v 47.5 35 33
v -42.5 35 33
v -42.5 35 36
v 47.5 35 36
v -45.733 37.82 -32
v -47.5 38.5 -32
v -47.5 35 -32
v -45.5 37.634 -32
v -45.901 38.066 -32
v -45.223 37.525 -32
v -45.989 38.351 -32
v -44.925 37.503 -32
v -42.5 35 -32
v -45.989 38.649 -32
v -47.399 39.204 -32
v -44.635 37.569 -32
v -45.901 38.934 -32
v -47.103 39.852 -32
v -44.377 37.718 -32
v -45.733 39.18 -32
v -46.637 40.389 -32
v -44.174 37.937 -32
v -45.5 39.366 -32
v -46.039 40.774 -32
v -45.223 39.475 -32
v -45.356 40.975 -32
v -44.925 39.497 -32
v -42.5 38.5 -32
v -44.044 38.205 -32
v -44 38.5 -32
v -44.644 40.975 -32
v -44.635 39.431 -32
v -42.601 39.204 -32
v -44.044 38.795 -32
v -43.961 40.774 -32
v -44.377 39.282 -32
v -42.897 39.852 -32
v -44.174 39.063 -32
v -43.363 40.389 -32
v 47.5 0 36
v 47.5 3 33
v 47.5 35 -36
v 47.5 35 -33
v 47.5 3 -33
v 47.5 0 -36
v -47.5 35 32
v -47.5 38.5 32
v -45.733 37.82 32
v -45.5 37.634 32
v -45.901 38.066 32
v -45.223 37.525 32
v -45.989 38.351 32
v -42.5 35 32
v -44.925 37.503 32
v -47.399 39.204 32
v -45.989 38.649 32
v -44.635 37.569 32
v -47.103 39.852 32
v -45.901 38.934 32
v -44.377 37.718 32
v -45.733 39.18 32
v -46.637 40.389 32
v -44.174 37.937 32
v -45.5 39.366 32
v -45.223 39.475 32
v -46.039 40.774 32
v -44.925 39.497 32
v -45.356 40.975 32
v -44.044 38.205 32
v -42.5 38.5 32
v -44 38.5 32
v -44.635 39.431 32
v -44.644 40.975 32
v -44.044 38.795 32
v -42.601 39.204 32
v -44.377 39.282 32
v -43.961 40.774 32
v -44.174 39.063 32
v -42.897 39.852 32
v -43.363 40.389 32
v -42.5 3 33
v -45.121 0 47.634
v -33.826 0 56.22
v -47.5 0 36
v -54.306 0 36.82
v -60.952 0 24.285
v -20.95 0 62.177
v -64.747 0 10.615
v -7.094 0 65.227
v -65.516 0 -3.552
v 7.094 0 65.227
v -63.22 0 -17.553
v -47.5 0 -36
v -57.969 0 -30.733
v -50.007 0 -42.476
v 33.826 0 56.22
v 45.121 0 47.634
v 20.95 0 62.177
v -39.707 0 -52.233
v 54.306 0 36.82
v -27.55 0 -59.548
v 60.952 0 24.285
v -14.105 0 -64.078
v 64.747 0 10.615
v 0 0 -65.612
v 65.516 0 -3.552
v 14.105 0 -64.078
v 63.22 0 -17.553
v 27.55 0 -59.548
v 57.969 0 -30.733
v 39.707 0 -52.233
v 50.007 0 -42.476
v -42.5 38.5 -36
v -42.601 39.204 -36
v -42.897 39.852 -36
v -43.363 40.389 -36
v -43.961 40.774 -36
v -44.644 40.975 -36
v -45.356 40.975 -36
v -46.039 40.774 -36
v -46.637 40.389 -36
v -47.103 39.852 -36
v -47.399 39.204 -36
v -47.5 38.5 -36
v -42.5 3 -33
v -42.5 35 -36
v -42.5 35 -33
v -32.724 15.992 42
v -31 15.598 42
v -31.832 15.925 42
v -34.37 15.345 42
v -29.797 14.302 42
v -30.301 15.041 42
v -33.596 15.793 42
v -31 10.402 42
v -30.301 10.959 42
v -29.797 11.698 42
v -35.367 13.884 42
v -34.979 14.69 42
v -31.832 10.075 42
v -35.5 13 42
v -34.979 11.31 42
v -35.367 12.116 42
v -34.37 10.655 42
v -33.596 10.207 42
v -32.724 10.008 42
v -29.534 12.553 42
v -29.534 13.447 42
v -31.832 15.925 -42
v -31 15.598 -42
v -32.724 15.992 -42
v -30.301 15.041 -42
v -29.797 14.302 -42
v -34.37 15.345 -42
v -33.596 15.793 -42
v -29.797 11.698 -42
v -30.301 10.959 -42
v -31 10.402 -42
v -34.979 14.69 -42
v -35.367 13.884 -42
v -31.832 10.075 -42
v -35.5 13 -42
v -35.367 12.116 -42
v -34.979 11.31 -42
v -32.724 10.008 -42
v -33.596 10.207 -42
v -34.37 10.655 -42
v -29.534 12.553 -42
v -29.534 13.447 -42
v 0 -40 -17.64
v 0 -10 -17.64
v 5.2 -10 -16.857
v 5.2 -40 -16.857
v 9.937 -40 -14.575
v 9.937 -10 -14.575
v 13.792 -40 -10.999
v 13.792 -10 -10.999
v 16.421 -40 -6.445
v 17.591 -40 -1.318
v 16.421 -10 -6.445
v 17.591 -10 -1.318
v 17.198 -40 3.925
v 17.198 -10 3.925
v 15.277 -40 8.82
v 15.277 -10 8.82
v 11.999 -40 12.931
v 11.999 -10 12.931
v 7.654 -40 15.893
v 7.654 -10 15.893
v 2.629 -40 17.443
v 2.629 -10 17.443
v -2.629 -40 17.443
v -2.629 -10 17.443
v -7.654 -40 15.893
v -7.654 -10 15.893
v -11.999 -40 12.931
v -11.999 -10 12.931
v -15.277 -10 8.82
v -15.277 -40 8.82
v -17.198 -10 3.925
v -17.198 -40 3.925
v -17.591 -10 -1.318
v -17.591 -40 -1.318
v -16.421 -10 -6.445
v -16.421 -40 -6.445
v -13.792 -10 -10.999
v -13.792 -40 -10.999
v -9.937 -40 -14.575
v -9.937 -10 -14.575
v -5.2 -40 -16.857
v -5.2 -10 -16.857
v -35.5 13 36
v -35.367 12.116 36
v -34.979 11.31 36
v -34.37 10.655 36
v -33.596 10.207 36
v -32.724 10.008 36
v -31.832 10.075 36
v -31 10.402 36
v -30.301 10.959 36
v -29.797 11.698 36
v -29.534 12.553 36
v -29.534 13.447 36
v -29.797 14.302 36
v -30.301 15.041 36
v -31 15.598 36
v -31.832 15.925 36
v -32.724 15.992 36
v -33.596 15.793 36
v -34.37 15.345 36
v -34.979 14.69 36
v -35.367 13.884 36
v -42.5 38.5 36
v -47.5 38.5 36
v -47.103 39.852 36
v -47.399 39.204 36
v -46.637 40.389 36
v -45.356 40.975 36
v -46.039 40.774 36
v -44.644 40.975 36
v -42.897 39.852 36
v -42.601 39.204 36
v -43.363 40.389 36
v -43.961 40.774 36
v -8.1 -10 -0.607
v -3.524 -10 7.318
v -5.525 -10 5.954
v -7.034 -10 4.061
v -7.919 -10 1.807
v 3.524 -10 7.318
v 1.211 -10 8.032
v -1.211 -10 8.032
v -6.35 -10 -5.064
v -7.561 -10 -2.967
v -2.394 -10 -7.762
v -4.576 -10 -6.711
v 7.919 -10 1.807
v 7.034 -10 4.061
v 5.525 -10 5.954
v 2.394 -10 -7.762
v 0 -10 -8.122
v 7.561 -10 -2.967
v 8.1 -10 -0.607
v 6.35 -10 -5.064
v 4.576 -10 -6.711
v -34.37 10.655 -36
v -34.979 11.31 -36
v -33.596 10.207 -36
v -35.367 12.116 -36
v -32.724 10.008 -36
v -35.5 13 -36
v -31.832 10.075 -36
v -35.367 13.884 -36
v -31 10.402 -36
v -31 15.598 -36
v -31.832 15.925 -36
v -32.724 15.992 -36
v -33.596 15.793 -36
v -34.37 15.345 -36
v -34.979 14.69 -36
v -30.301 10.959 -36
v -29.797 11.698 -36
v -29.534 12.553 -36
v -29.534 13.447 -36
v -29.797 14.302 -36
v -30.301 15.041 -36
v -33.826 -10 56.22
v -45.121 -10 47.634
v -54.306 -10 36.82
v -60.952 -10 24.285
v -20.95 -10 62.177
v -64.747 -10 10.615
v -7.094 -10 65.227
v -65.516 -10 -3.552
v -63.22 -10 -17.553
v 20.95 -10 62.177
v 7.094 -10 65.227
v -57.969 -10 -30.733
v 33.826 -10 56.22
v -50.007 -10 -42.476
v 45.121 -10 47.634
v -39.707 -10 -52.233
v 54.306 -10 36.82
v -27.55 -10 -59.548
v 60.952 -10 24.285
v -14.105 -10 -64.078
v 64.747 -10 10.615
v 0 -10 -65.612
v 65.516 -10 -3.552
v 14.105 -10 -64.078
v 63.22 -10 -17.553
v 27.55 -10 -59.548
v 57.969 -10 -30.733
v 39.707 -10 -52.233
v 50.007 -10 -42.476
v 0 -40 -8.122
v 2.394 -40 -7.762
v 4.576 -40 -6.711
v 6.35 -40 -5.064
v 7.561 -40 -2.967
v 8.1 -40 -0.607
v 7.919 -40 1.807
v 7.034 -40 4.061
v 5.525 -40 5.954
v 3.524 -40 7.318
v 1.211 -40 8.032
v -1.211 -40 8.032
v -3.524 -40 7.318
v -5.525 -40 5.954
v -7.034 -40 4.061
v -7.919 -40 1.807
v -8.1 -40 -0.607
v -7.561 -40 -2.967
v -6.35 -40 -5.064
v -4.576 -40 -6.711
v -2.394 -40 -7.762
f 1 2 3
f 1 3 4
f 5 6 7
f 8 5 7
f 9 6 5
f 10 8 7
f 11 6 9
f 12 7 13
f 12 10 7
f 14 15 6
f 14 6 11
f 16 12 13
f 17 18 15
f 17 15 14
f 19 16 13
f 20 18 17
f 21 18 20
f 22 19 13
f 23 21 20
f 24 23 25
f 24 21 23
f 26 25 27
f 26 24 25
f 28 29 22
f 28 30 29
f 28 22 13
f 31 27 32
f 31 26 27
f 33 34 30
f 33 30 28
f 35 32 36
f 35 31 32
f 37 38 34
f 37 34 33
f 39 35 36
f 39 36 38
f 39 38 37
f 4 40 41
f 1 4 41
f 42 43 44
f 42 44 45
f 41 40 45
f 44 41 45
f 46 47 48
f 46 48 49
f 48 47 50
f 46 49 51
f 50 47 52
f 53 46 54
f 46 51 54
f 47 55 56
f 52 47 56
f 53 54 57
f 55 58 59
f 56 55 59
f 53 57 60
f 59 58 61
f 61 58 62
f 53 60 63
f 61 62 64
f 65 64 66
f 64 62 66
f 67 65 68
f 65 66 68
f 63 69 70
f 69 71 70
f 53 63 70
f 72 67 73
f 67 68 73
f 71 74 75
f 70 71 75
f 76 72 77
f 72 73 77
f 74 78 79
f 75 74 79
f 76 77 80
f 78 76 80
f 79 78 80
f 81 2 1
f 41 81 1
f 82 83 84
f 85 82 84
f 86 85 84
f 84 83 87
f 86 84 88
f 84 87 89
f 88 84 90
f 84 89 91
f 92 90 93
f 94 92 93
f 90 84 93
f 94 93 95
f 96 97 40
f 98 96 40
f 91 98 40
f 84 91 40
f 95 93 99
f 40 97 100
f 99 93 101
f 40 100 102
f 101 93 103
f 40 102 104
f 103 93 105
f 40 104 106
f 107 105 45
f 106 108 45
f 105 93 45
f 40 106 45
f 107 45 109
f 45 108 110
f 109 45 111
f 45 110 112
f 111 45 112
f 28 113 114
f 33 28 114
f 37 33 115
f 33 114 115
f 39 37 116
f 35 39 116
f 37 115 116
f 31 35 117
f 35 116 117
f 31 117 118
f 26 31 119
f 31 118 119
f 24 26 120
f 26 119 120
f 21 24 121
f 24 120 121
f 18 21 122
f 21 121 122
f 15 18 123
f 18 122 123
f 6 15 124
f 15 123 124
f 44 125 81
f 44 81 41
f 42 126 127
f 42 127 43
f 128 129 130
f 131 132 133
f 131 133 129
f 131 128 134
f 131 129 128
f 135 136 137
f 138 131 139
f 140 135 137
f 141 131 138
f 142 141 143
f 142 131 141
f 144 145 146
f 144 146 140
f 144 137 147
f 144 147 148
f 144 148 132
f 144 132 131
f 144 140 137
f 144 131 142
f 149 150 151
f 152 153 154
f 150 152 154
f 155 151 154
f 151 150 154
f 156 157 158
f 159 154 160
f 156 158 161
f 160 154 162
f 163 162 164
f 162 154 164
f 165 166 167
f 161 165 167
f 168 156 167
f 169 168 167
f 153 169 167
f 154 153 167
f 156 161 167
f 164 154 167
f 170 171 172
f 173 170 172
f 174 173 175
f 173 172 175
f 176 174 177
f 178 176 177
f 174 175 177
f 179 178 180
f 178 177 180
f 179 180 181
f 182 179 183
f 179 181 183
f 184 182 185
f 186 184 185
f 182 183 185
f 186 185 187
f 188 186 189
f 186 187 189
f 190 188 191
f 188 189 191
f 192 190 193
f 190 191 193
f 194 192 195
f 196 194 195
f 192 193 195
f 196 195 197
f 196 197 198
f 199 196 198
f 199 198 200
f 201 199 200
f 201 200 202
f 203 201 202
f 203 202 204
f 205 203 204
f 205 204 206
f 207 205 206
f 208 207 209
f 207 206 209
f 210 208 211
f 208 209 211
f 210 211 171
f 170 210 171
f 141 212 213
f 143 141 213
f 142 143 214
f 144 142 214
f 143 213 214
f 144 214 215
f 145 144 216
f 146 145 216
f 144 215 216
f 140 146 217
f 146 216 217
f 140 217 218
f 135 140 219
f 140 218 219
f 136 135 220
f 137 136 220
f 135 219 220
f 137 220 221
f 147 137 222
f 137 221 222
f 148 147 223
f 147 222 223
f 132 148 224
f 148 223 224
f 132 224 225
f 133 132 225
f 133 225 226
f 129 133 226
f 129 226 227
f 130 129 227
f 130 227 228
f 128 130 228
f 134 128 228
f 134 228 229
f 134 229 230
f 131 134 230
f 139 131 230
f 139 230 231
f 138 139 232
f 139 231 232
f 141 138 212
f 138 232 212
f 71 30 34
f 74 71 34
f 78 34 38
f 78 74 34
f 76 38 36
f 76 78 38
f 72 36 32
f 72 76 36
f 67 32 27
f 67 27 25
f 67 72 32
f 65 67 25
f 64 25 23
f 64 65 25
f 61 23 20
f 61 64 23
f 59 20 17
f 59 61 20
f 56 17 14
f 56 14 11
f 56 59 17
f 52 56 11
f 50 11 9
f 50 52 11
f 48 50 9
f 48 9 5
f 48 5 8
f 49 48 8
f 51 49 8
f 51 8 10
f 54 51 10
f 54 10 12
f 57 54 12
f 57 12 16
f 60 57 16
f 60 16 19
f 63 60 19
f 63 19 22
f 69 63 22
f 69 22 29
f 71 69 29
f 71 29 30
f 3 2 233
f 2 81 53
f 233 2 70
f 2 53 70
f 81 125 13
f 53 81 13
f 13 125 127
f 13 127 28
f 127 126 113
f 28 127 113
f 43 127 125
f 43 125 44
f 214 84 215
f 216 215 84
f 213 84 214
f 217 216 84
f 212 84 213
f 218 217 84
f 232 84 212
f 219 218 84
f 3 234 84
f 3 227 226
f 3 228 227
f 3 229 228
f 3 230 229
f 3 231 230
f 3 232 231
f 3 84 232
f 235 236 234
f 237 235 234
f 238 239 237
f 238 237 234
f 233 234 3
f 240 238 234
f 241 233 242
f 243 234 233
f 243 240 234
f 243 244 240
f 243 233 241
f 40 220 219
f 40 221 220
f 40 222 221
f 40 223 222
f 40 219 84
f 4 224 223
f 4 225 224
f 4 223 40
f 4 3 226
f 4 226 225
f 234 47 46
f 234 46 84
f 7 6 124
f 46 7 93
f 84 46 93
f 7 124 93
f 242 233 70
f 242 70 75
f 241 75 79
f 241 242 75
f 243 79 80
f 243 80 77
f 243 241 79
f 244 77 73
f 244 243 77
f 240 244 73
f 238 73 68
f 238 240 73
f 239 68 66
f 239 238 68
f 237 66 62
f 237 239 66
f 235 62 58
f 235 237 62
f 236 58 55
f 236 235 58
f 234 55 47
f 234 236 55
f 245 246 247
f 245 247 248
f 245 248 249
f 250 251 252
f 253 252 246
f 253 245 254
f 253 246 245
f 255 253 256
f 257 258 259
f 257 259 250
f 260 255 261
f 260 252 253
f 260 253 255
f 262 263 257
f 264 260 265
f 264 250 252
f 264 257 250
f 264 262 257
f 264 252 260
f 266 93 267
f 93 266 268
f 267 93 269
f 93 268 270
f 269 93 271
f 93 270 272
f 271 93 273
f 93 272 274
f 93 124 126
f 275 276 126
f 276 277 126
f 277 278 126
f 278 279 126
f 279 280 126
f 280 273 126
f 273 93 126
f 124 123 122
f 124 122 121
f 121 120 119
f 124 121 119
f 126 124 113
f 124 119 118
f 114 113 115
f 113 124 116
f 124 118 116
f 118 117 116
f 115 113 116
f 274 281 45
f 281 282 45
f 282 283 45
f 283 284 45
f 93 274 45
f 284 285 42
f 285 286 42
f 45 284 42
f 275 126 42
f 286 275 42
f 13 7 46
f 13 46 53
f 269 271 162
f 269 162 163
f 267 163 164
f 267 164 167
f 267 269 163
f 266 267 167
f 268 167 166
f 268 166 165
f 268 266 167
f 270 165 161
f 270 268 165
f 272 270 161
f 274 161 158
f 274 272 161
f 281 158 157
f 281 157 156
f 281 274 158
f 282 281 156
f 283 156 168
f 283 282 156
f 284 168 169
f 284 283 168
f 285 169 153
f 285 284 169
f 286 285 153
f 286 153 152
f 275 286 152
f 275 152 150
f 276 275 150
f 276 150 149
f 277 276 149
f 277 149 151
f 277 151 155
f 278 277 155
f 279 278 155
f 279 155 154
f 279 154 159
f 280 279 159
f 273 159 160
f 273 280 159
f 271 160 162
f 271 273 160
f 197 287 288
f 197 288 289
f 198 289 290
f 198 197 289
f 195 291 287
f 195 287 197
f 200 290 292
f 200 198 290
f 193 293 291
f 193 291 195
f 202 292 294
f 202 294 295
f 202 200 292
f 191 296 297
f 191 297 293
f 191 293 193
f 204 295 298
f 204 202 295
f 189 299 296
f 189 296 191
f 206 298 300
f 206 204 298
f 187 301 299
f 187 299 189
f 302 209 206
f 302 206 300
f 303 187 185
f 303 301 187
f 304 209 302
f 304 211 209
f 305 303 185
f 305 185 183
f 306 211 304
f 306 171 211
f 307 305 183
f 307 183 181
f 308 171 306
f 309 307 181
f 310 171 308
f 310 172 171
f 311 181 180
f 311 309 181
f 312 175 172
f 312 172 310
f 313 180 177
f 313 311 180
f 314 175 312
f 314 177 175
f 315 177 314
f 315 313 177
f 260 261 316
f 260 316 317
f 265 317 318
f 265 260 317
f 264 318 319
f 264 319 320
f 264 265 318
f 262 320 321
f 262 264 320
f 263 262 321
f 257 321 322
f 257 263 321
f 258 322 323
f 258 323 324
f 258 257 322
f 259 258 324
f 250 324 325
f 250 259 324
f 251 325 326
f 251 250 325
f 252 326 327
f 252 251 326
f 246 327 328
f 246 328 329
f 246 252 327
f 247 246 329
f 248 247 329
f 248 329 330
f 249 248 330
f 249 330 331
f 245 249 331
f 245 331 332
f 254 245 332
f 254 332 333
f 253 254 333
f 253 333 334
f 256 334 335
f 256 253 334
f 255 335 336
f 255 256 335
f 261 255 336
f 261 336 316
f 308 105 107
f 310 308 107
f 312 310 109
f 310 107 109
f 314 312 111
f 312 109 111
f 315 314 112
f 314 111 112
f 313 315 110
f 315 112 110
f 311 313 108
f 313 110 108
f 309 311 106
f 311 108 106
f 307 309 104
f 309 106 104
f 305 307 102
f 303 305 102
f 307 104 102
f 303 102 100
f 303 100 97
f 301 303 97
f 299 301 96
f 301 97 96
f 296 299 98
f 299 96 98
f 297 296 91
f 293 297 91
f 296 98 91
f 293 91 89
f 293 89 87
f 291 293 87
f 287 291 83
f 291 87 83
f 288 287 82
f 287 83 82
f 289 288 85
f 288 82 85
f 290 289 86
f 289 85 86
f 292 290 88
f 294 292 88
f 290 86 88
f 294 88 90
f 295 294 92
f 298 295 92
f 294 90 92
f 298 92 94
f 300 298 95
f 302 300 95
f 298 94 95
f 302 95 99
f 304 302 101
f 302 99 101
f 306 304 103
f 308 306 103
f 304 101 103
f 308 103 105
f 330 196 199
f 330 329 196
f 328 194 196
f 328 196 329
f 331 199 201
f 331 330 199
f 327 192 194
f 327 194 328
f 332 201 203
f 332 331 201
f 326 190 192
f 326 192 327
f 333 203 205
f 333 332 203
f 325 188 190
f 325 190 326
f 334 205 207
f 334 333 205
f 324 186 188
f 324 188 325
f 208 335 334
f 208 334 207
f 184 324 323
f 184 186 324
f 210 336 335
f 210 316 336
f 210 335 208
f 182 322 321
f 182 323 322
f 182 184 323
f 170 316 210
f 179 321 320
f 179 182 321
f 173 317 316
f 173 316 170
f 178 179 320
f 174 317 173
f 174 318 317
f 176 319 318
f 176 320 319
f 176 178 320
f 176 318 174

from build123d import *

# Parameters (mm, degrees)
SKETCH1_W           = 95
SKETCH1_H           = 72
BOSS_EXTRUDE1_DEPTH = 35
SKETCH5_W           = 90
SKETCH5_H           = 66
CUT_EXTRUDE1_DEPTH  = 32
SKETCH9_R           = 3
BOSS_EXTRUDE4_DEPTH = 6
BOSS_EXTRUDE5_DEPTH = 4
SKETCH11_R          = 65.611758171
BOSS_EXTRUDE6_DEPTH = 10
SKETCH12_R          = 17.640424805
SKETCH12_R_2        = 8.122416637
BOSS_EXTRUDE7_DEPTH = 30
SKETCH13_R          = 1
BOSS_EXTRUDE8_DEPTH = 68


with BuildPart() as part:
    # Sketch1 → Boss-Extrude1 (new body)
    with BuildSketch(Plane(origin=(0, 0, 0), x_dir=(1, 0, 0), z_dir=(0, 1, 0))):
        Rectangle(SKETCH1_W, SKETCH1_H)
    extrude(amount=BOSS_EXTRUDE1_DEPTH)

    # Sketch5 → Cut-Extrude1 (cut)
    with BuildSketch(Plane(origin=(0, 35, 0), x_dir=(1, 0, 0), z_dir=(0, 1, 0))):
        with Locations((2.5, 0)):
            Rectangle(SKETCH5_W, SKETCH5_H)
    extrude(amount=-CUT_EXTRUDE1_DEPTH, mode=Mode.SUBTRACT)

    # Sketch9 → Boss-Extrude4 (add)
    with BuildSketch(Plane.XY.offset(36)):
        with Locations(Location((-32.5, 13, 0), (0, 0, 180))):
            Circle(SKETCH9_R)
    boss_extrude4 = extrude(amount=BOSS_EXTRUDE4_DEPTH)

    # Mirror3: Boss-Extrude4 across plane
    add(boss_extrude4.mirror(Plane.XY))

    # Sketch10 → Boss-Extrude5 (add)
    with BuildSketch(Plane.XY.offset(36)):
        with BuildLine():
            Line((-42.5, 35), (-42.5, 38.5))
            ThreePointArc((-42.5, 38.5), (-45, 41), (-47.5, 38.5))
            Line((-47.5, 38.5), (-47.5, 35))
            Line((-47.5, 35), (-42.5, 35))
        make_face()
    boss_extrude5 = extrude(amount=-BOSS_EXTRUDE5_DEPTH)

    # Mirror4: Boss-Extrude5 across plane
    add(boss_extrude5.mirror(Plane.XY))

    # Sketch11 → Boss-Extrude6 (add)
    with BuildSketch(Plane.XZ):
        with Locations(Location((0, 0, 0), (0, 0, 270))):
            Circle(SKETCH11_R)
    extrude(amount=BOSS_EXTRUDE6_DEPTH)

    # Sketch12 → Boss-Extrude7 (add)
    with BuildSketch(Plane.XZ.offset(10)):
        with Locations(Location((0, 0, 0), (0, 0, 270))):
            Circle(SKETCH12_R)
        with Locations(Location((0, 0, 0), (0, 0, 270))):
            Circle(SKETCH12_R_2, mode=Mode.SUBTRACT)
    extrude(amount=BOSS_EXTRUDE7_DEPTH)

    # Sketch13 → Boss-Extrude8 (add)
    with BuildSketch(Plane.XY.offset(36)):
        with Locations((-45, 38.5)):
            Circle(SKETCH13_R)
    extrude(amount=-BOSS_EXTRUDE8_DEPTH)


solid = part.part
